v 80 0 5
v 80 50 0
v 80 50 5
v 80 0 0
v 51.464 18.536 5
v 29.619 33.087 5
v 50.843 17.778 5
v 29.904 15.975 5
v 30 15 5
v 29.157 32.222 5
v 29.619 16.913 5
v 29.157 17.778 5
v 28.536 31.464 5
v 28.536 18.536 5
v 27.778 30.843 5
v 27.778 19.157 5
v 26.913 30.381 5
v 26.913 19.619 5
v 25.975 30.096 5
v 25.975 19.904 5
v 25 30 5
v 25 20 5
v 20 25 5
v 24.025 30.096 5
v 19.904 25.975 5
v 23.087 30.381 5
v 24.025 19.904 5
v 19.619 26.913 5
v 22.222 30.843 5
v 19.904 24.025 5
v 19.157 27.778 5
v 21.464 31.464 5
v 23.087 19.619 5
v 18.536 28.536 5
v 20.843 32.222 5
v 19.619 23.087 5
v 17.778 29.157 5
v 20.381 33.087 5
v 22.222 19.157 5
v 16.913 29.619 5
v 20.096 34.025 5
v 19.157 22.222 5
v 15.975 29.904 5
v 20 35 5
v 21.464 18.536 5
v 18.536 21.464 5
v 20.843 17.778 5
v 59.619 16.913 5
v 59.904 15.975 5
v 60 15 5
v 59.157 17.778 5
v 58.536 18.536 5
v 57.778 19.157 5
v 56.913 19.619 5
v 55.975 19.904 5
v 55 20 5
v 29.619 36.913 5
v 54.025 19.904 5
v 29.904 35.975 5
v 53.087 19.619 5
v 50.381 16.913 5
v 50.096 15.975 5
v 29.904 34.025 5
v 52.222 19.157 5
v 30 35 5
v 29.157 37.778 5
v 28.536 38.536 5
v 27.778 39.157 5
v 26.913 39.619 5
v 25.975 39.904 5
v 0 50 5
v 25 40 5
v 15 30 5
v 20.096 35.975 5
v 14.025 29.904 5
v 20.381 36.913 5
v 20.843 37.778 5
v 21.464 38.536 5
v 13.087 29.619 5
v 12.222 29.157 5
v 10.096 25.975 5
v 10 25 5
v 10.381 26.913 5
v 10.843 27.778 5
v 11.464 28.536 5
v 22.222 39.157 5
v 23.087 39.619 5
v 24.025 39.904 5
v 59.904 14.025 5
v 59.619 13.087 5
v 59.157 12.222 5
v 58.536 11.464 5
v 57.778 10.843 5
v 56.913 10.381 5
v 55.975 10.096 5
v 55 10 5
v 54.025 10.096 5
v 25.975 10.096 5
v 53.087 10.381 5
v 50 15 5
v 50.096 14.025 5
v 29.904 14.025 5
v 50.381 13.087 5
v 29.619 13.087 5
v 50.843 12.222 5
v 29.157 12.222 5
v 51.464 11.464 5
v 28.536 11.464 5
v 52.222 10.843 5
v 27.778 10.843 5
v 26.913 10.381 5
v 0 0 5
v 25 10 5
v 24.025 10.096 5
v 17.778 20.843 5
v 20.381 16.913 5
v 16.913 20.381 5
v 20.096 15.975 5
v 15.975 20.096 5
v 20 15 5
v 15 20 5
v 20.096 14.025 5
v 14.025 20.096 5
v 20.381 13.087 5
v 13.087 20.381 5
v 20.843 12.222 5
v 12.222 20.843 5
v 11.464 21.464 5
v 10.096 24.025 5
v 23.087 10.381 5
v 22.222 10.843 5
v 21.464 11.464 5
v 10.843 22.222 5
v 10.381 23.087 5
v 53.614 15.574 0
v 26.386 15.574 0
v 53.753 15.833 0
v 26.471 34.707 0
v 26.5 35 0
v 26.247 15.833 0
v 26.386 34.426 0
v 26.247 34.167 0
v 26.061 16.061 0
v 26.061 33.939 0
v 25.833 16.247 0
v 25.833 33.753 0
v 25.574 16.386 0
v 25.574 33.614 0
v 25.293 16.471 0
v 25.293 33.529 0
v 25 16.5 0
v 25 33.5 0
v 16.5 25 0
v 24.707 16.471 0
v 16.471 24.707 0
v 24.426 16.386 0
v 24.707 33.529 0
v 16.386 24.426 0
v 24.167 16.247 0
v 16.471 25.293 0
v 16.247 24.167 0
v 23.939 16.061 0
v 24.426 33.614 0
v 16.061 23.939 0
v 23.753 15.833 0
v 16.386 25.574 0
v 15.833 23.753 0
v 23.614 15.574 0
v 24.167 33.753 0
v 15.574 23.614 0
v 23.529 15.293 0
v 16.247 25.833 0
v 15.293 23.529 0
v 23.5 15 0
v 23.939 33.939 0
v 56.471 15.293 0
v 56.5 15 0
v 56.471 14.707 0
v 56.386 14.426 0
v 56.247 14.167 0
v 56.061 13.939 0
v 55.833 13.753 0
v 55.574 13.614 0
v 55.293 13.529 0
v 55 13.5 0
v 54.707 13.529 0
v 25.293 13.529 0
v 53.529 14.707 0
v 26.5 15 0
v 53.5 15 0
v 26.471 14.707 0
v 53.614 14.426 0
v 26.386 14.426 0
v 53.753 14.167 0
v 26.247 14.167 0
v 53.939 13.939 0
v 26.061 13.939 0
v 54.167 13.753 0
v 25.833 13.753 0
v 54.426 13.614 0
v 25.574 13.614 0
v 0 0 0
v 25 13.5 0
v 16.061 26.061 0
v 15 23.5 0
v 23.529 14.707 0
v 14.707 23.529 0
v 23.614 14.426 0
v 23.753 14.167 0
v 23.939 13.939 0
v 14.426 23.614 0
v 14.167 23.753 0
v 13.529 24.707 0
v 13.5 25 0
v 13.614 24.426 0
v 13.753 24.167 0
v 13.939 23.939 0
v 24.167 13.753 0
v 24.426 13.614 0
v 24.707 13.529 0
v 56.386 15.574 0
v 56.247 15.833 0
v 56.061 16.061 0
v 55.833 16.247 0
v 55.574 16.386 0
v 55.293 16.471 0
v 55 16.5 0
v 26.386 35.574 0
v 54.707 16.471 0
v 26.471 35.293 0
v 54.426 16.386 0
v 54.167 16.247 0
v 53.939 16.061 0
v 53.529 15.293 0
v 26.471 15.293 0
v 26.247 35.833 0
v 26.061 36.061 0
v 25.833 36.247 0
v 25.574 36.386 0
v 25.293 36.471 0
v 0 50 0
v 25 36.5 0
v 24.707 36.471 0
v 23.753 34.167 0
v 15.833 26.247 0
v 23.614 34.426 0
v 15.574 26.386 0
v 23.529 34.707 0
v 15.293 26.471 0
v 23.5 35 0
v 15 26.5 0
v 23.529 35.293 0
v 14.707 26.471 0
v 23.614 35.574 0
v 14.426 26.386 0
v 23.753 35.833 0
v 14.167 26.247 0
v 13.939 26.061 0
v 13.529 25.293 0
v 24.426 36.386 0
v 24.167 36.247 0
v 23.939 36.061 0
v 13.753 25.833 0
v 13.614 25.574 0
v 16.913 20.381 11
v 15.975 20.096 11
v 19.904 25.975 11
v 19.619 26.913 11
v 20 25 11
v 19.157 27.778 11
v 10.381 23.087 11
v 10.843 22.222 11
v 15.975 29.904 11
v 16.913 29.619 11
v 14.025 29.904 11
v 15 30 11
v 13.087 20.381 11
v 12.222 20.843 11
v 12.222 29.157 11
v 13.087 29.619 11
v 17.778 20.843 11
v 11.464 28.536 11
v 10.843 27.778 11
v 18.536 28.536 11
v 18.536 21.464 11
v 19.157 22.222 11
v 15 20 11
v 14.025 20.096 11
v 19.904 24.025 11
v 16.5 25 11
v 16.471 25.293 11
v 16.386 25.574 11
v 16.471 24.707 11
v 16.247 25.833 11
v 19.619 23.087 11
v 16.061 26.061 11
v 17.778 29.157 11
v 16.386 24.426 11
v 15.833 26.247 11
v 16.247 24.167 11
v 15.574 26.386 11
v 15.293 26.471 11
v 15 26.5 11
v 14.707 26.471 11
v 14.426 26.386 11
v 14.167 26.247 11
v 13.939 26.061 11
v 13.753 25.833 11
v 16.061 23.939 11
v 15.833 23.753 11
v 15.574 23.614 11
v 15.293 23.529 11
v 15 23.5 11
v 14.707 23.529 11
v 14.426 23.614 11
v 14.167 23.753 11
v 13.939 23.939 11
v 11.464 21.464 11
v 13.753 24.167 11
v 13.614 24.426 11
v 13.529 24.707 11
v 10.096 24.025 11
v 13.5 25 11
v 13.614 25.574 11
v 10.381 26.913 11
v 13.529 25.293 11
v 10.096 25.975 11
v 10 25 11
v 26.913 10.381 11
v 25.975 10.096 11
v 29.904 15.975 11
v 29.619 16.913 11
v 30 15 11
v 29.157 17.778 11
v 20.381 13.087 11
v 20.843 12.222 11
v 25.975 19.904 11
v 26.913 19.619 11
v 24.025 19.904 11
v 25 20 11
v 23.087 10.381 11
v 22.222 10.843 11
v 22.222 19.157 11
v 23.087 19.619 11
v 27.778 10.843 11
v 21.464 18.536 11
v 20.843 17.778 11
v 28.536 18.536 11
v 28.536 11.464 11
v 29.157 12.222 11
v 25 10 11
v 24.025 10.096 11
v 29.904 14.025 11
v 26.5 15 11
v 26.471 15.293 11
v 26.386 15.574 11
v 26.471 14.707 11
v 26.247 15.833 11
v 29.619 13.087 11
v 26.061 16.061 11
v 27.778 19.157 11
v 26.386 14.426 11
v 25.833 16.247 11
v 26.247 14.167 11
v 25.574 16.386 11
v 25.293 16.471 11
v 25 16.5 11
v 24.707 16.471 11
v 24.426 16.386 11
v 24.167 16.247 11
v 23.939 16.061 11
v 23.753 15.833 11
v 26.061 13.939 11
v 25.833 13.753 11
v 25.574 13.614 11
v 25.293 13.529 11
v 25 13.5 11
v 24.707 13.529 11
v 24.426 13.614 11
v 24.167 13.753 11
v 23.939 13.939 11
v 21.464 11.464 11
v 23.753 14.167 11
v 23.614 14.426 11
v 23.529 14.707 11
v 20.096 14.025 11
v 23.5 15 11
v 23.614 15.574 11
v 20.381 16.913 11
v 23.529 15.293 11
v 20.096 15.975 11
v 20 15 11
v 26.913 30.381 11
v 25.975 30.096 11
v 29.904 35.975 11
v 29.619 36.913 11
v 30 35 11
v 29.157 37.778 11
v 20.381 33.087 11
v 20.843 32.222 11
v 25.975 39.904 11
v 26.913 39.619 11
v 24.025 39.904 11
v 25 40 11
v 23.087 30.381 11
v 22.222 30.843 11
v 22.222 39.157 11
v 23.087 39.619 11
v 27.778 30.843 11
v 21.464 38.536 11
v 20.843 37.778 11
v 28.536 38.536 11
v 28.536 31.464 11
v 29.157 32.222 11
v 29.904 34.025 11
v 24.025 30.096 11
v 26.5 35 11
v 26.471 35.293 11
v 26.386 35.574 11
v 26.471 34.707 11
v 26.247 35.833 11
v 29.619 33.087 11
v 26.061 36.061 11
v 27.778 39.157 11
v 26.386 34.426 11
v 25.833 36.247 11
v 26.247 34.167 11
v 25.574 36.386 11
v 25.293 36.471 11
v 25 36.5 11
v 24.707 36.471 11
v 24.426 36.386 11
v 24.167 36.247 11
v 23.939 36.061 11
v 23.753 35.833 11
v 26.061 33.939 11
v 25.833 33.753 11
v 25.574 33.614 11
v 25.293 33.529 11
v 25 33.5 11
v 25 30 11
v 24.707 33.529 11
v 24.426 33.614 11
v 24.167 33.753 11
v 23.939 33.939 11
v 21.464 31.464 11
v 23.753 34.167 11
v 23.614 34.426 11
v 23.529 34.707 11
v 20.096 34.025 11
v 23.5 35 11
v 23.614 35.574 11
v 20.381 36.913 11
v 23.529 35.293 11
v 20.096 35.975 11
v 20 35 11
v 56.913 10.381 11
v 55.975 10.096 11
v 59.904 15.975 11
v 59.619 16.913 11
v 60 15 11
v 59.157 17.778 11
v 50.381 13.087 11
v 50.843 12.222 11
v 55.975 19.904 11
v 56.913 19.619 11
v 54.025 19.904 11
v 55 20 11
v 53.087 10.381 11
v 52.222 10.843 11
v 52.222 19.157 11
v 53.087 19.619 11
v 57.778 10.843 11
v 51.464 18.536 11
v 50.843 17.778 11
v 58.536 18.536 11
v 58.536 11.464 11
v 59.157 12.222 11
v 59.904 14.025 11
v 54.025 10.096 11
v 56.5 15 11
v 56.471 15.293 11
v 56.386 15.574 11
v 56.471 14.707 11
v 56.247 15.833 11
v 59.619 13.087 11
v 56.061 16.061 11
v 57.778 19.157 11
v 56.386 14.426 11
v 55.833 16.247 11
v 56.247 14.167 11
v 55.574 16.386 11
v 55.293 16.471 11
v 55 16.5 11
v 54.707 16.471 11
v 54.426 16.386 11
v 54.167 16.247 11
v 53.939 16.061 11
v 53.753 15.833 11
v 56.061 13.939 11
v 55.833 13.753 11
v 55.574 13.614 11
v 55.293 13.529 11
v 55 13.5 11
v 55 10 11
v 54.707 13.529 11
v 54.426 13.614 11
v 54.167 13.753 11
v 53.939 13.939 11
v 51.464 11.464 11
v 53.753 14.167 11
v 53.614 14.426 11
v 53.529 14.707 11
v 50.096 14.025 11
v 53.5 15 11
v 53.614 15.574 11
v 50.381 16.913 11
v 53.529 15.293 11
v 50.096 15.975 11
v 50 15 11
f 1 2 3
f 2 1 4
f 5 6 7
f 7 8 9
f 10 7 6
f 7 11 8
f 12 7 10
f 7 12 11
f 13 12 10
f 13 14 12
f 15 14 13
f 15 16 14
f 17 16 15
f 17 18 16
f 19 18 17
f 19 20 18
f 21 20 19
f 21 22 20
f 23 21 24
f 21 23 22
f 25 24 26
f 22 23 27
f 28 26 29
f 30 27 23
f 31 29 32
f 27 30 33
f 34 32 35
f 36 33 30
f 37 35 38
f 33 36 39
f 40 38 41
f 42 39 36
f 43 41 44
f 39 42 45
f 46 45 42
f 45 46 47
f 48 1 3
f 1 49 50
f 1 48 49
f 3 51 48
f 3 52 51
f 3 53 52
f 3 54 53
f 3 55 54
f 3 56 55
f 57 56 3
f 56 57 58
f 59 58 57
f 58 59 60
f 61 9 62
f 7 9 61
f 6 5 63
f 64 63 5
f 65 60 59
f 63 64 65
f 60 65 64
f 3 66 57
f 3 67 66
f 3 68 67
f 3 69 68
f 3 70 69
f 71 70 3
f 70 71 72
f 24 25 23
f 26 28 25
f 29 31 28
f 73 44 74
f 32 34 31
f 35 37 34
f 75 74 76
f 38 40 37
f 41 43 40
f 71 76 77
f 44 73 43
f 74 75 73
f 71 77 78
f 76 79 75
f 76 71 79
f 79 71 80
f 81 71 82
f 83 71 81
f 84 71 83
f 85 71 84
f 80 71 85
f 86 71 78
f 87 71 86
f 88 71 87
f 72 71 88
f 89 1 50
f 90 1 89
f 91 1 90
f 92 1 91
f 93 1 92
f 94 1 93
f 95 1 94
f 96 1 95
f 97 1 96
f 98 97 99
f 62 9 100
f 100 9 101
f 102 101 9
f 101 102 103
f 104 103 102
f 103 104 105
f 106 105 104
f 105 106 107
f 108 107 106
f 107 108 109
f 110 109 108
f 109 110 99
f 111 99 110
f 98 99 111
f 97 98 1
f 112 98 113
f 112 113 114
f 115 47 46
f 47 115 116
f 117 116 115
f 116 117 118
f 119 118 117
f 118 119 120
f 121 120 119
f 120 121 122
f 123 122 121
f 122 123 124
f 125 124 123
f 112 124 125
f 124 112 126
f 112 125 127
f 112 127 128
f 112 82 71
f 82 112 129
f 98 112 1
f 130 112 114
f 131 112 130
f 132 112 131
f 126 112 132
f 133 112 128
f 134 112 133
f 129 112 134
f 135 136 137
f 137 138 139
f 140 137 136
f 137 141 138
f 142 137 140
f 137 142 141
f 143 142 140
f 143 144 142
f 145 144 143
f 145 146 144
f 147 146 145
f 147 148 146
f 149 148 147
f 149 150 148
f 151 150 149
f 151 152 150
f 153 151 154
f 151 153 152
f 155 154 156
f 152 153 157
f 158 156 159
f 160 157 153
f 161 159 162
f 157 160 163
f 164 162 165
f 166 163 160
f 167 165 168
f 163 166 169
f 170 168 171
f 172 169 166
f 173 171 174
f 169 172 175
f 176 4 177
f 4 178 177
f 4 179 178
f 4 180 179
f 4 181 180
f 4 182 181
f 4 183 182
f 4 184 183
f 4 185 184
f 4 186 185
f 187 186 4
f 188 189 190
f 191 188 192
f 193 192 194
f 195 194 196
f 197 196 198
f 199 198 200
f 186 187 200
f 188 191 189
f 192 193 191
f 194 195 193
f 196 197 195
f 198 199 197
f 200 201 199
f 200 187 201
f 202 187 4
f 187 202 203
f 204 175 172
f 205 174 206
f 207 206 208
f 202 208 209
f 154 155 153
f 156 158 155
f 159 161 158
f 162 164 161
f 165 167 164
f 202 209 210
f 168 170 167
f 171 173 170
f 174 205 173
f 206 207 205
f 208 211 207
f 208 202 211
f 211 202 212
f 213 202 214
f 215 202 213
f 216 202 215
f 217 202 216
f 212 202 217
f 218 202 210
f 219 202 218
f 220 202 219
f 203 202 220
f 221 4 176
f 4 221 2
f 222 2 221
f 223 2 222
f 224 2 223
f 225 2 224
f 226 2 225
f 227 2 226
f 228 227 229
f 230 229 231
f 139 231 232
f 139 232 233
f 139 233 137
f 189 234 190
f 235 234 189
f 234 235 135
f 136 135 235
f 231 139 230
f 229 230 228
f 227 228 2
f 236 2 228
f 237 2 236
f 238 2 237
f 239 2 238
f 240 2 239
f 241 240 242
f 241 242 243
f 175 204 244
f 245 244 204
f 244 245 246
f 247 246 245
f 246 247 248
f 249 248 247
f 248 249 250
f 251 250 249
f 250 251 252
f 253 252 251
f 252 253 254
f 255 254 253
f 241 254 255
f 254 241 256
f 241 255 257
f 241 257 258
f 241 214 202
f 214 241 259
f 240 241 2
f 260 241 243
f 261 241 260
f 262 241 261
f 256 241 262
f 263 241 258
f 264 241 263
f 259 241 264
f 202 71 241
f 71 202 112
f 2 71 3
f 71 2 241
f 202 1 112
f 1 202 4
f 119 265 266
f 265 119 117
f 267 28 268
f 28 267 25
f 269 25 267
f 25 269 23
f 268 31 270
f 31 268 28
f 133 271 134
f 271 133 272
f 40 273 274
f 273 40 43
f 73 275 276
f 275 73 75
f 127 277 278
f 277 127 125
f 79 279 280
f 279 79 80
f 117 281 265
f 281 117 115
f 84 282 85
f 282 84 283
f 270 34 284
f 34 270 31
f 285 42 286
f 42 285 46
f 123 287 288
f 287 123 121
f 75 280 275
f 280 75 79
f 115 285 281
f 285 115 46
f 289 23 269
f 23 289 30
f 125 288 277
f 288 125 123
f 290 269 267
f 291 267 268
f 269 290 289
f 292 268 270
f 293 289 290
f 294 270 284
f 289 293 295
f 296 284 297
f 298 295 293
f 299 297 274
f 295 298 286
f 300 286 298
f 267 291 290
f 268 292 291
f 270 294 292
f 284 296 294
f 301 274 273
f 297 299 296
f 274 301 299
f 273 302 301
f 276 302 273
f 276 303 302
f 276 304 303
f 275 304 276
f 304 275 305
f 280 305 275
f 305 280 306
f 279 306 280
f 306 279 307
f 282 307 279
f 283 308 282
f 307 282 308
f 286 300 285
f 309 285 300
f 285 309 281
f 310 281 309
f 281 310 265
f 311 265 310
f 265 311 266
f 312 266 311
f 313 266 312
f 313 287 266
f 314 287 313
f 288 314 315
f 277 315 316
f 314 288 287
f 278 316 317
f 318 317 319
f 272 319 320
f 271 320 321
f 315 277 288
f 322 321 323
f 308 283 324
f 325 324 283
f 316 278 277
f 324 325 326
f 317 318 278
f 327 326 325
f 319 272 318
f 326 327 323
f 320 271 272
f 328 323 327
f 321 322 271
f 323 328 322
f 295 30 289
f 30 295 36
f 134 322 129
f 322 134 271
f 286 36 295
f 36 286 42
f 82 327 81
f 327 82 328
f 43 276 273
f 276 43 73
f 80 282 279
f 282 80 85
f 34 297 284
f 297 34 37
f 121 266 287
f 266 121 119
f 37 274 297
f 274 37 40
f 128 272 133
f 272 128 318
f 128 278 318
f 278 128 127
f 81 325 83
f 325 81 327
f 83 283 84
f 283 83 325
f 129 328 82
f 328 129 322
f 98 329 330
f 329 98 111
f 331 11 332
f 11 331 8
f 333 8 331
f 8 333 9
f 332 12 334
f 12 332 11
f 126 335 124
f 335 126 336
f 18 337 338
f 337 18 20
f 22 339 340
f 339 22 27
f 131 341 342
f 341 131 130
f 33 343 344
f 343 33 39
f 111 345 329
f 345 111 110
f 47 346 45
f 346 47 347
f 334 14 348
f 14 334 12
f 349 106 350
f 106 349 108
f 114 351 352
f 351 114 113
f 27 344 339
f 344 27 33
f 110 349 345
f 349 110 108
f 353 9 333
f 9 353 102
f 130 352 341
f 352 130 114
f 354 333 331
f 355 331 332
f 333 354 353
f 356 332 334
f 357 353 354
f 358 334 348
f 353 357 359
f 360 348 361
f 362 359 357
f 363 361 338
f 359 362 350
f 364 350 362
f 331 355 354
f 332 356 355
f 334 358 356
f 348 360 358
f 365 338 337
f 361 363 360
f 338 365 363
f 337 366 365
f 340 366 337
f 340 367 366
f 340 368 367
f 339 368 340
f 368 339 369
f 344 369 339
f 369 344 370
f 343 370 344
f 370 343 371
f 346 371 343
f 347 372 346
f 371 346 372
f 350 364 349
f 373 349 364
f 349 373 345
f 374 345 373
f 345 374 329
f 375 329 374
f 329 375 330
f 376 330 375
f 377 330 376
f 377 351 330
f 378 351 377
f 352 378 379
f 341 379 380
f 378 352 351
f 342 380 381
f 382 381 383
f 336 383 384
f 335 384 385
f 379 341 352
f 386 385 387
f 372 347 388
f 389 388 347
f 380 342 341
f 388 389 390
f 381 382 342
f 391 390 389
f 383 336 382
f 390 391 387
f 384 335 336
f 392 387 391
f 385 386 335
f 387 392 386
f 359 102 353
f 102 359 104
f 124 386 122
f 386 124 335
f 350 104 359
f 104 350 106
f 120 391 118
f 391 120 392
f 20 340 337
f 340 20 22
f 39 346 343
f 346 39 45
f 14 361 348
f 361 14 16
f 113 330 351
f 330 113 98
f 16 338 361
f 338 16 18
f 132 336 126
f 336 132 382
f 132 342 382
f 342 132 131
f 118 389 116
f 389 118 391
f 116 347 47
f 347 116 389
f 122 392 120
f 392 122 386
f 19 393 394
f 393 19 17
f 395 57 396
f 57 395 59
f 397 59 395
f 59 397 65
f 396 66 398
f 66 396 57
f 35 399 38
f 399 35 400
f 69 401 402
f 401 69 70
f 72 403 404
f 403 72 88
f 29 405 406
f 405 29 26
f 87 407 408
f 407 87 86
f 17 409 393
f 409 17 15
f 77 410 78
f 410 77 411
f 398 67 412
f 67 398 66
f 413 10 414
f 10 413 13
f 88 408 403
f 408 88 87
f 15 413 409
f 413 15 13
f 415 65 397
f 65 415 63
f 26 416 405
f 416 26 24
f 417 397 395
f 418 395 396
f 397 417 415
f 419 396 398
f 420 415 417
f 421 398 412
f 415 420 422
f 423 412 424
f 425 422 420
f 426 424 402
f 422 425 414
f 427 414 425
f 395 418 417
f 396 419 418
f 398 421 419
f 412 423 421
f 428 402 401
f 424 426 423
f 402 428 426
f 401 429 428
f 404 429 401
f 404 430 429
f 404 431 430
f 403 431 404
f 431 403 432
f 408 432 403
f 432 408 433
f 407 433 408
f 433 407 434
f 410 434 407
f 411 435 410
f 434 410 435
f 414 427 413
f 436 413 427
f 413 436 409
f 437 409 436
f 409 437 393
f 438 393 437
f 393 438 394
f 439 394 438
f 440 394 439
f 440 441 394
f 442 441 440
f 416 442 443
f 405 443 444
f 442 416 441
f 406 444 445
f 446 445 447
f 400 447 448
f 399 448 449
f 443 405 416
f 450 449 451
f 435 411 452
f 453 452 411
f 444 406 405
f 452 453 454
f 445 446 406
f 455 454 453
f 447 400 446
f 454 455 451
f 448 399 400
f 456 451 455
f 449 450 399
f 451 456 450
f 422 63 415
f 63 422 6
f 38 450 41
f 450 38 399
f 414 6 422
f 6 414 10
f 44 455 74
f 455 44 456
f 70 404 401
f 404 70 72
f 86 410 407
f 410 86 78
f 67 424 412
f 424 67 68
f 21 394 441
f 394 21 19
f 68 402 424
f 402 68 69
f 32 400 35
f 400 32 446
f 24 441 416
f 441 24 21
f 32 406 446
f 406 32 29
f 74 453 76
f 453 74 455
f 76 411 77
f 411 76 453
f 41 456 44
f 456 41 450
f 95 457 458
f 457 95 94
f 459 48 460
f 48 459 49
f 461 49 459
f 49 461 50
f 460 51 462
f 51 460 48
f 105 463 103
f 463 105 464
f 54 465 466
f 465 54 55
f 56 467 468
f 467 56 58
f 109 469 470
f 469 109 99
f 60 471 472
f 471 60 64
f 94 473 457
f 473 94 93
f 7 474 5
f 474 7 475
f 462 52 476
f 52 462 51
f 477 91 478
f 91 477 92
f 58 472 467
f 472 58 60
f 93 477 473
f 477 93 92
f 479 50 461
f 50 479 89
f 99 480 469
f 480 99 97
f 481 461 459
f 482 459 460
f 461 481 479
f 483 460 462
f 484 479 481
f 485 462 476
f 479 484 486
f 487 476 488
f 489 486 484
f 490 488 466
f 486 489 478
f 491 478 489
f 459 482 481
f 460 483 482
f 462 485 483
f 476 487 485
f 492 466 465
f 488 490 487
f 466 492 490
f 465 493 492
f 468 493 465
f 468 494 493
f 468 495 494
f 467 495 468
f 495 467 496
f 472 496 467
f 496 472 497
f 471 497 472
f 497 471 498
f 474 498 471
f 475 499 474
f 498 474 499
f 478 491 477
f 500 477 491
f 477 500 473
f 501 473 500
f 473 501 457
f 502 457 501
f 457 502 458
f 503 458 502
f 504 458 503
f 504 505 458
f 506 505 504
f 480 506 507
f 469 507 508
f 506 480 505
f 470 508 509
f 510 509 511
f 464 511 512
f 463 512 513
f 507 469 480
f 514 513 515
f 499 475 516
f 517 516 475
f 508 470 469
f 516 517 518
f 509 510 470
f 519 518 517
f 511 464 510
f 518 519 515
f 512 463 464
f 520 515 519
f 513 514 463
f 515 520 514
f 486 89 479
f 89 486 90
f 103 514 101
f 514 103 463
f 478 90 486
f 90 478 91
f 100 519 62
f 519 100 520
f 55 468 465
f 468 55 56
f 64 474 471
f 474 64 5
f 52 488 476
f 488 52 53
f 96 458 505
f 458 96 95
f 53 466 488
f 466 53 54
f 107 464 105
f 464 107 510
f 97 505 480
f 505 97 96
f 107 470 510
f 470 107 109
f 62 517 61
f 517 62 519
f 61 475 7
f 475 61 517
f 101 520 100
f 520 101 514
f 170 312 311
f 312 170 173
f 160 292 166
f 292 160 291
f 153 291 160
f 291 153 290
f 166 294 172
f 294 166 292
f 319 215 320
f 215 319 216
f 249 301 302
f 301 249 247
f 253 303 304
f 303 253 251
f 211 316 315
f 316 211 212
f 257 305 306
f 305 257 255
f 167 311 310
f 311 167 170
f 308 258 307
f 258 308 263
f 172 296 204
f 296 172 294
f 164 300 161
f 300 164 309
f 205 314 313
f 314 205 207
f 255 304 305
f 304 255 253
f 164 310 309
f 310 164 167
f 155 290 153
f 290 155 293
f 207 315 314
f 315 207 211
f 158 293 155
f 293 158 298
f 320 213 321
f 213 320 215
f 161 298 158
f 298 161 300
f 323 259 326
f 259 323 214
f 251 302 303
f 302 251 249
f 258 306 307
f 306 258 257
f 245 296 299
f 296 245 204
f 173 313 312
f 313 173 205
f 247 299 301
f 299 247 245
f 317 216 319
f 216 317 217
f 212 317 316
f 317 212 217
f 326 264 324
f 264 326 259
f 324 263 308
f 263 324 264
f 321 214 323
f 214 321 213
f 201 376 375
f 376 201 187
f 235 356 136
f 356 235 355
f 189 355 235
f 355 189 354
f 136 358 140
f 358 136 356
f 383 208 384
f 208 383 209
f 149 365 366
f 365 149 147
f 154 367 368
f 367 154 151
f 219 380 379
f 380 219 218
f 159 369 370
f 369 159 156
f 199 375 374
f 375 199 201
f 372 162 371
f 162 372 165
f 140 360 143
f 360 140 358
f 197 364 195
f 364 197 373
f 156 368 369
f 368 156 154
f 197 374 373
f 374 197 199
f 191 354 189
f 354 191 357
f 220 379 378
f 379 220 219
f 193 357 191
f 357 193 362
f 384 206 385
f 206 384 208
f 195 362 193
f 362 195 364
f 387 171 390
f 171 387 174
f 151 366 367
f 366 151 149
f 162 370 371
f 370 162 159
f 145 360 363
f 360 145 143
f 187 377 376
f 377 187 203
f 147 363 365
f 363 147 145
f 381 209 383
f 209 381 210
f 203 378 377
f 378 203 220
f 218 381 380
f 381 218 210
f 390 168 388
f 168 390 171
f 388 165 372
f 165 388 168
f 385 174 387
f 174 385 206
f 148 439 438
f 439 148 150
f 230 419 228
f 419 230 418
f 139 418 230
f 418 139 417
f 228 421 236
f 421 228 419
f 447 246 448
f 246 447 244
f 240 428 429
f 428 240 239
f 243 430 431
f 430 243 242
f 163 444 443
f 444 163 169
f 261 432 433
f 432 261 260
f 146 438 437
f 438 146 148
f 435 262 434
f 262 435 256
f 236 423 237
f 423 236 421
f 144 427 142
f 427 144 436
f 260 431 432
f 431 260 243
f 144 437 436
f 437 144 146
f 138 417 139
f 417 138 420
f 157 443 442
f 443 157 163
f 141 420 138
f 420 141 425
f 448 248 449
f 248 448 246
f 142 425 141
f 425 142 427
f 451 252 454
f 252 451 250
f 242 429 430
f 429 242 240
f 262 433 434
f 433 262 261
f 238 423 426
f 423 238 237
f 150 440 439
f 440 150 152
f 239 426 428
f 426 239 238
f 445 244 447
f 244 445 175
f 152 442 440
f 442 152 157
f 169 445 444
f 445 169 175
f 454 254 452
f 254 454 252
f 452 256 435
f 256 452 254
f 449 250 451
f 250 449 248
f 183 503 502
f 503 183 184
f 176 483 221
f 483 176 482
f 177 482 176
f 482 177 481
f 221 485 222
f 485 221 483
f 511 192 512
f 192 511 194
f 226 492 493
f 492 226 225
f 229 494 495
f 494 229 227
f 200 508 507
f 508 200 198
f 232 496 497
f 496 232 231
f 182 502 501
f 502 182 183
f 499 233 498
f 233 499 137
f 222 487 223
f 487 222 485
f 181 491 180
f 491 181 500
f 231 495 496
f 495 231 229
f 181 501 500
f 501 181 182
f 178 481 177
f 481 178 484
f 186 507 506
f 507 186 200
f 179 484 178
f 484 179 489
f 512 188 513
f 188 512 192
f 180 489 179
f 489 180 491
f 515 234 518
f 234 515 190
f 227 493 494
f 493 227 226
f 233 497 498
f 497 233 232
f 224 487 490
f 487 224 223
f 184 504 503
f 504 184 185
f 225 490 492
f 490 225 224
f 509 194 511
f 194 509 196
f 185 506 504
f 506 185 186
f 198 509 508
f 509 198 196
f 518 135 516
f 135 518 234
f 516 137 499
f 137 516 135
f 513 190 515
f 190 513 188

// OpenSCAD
$fn = 32;

// ----------------------------------------------------------------------
// Boss field: plate with bosses at given coordinates
// ----------------------------------------------------------------------

// --- parameters (mm) ---
plate_l = 80;             // plate length, X
plate_w = 50;             // plate width, Y
plate_t = 5;              // plate thickness, Z
boss_d = 10;              // boss diameter
boss_h = 6;               // boss height above the plate
bore_d = 3;               // boss bore

total_h = plate_t + boss_h;  // overall height

difference() {
  union() {
    cube([plate_l, plate_w, plate_t]);
    translate([15, 25, plate_t]) cylinder(h = boss_h, d = boss_d);
    translate([25, 15, plate_t]) cylinder(h = boss_h, d = boss_d);
    translate([25, 35, plate_t]) cylinder(h = boss_h, d = boss_d);
    translate([55, 15, plate_t]) cylinder(h = boss_h, d = boss_d);
  }
  translate([15, 25, -1]) cylinder(h = total_h + 2, d = bore_d);
  translate([25, 15, -1]) cylinder(h = total_h + 2, d = bore_d);
  translate([25, 35, -1]) cylinder(h = total_h + 2, d = bore_d);
  translate([55, 15, -1]) cylinder(h = total_h + 2, d = bore_d);
}
